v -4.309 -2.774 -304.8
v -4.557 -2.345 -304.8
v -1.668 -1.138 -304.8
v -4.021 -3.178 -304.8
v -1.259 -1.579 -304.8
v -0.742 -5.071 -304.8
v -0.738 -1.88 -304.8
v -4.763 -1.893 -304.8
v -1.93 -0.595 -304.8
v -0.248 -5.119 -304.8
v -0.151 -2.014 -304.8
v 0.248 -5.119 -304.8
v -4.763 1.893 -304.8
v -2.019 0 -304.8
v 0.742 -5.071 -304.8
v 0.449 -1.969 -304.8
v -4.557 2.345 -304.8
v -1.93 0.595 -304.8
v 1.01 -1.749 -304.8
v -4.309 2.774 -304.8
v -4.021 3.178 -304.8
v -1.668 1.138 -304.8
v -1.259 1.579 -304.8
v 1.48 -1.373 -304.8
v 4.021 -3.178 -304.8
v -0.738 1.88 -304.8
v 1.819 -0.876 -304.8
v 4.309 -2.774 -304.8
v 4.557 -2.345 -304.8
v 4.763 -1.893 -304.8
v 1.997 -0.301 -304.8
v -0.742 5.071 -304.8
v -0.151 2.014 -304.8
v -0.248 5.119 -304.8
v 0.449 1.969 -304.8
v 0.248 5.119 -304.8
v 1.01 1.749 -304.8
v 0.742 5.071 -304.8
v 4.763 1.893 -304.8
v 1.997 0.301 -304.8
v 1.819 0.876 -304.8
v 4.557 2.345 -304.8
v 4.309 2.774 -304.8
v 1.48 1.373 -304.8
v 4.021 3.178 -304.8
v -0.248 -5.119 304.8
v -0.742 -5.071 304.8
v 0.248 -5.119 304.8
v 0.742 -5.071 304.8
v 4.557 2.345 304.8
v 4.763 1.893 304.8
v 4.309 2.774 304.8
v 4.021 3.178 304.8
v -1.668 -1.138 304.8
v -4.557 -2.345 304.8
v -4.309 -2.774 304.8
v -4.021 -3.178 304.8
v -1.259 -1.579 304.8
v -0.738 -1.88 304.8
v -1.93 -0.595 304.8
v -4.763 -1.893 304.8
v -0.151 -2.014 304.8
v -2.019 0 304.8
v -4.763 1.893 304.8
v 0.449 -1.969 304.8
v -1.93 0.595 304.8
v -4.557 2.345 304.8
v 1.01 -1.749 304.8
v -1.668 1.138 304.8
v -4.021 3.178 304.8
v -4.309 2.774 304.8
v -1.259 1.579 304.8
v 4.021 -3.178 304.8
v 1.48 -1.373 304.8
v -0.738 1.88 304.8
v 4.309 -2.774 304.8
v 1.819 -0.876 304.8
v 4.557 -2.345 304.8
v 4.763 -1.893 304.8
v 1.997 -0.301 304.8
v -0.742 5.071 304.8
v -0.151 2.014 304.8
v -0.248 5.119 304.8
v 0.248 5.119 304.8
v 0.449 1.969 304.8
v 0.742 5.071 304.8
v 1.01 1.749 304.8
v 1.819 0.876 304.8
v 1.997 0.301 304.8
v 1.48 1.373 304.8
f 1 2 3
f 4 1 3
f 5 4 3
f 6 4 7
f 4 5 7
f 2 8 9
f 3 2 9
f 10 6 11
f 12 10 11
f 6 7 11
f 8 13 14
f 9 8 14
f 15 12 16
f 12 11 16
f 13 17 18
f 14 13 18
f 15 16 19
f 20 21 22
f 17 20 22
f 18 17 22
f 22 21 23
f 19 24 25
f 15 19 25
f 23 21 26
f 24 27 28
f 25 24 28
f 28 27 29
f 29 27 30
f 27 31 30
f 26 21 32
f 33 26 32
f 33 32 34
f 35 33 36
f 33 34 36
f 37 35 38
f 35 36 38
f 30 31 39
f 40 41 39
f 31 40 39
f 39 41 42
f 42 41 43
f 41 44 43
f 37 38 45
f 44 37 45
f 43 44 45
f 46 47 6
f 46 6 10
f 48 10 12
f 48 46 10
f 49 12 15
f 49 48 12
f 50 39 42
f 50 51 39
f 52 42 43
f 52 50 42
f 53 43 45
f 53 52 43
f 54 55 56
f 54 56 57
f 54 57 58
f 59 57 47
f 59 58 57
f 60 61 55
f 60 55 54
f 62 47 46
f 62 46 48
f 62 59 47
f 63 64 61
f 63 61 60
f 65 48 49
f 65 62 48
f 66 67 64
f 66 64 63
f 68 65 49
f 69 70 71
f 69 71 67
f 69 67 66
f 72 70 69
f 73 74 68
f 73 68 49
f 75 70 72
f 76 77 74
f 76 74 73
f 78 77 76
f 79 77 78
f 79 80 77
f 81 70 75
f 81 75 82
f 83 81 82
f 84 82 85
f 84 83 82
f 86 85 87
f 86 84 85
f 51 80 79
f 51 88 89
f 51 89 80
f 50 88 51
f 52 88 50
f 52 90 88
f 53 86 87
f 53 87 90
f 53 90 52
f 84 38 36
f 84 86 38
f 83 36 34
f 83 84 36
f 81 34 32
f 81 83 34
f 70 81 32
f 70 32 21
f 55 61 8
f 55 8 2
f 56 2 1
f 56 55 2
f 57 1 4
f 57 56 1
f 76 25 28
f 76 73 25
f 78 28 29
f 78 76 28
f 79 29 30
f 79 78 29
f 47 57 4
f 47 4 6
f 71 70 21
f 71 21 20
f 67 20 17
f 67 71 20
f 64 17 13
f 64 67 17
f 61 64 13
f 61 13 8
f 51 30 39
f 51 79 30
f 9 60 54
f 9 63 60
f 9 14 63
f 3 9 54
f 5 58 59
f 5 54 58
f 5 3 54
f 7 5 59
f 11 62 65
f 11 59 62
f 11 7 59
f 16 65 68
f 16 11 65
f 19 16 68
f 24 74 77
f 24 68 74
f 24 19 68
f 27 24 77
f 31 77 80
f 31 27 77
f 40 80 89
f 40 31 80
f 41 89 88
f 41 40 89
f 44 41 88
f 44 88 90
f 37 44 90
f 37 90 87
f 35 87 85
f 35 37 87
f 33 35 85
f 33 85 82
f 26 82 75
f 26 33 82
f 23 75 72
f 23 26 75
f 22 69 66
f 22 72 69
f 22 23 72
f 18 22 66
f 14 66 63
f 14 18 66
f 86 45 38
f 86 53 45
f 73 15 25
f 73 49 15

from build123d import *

# Parameters (mm, degrees)
SKETCH2_R                            = 2.0193
BOSS_EXTRUDE1_DEPTH                  = 304.8
F_10_32_TAPPED_HOLE2_D               = 4.0386
F_10_32_TAPPED_HOLE2_DEPTH           = 16.34744
F_10_32_TAPPED_HOLE2_TIP             = 1.213317848
F_10_32_TAPPED_HOLE2_ON_FACE_2_D     = 4.0386
F_10_32_TAPPED_HOLE2_ON_FACE_2_DEPTH = 16.34744
F_10_32_TAPPED_HOLE2_ON_FACE_2_TIP   = 1.213317848


with BuildPart() as part:
    # Sketch2 → Boss-Extrude1 (new, symmetric)
    with BuildSketch(Plane.XY):
        with BuildLine():
            ThreePointArc((0.741687758, 5.071047688), (0, 5.125000037), (-0.741687758, 5.071047688))
            Line((-0.741687758, 5.071047688), (-4.020812242, 3.177844283))
            ThreePointArc((-4.020812242, 3.177844283), (-4.438380226, 2.562500019), (-4.7625, 1.893203404))
            Line((-4.7625, 1.893203404), (-4.7625, -1.893203404))
            ThreePointArc((-4.7625, -1.893203404), (-4.438380226, -2.562500019), (-4.020812242, -3.177844283))
            Line((-4.020812242, -3.177844283), (-0.741687758, -5.071047688))
            ThreePointArc((-0.741687758, -5.071047688), (0, -5.125000037), (0.741687758, -5.071047688))
            Line((0.741687758, -5.071047688), (4.020812242, -3.177844283))
            ThreePointArc((4.020812242, -3.177844283), (4.438380226, -2.562500019), (4.7625, -1.893203404))
            Line((4.7625, -1.893203404), (4.7625, 1.893203404))
            ThreePointArc((4.7625, 1.893203404), (4.438380226, 2.562500019), (4.020812242, 3.177844283))
            Line((4.020812242, 3.177844283), (0.741687758, 5.071047688))
        make_face()
        with Locations(Location((0, 0, 0), (0, 0, 180))):
            Circle(SKETCH2_R, mode=Mode.SUBTRACT)
    extrude(amount=BOSS_EXTRUDE1_DEPTH, both=True)

    # #10-32 Tapped Hole2
    with Locations(Plane(origin=(0, 0, -304.8), x_dir=(-1, 0, 0), z_dir=(0, 0, -1))):
        with Locations((0, 0)):
            Hole(F_10_32_TAPPED_HOLE2_D / 2, depth=F_10_32_TAPPED_HOLE2_DEPTH)
            with Locations((0, 0, -(F_10_32_TAPPED_HOLE2_DEPTH + F_10_32_TAPPED_HOLE2_TIP / 2))):  # 118° drill point
                Cone(0, F_10_32_TAPPED_HOLE2_D / 2, F_10_32_TAPPED_HOLE2_TIP, mode=Mode.SUBTRACT)

    # #10-32 Tapped Hole2 on face 2
    with Locations(Plane(origin=(0, 0, 304.8), x_dir=(-1, 0, 0), z_dir=(0, 0, -1))):
        with Locations((0, 0)):
            Hole(F_10_32_TAPPED_HOLE2_ON_FACE_2_D / 2, depth=F_10_32_TAPPED_HOLE2_ON_FACE_2_DEPTH)
            with Locations((0, 0, -(F_10_32_TAPPED_HOLE2_ON_FACE_2_DEPTH + F_10_32_TAPPED_HOLE2_ON_FACE_2_TIP / 2))):  # 118° drill point
                Cone(0, F_10_32_TAPPED_HOLE2_ON_FACE_2_D / 2, F_10_32_TAPPED_HOLE2_ON_FACE_2_TIP, mode=Mode.SUBTRACT)


solid = part.part
